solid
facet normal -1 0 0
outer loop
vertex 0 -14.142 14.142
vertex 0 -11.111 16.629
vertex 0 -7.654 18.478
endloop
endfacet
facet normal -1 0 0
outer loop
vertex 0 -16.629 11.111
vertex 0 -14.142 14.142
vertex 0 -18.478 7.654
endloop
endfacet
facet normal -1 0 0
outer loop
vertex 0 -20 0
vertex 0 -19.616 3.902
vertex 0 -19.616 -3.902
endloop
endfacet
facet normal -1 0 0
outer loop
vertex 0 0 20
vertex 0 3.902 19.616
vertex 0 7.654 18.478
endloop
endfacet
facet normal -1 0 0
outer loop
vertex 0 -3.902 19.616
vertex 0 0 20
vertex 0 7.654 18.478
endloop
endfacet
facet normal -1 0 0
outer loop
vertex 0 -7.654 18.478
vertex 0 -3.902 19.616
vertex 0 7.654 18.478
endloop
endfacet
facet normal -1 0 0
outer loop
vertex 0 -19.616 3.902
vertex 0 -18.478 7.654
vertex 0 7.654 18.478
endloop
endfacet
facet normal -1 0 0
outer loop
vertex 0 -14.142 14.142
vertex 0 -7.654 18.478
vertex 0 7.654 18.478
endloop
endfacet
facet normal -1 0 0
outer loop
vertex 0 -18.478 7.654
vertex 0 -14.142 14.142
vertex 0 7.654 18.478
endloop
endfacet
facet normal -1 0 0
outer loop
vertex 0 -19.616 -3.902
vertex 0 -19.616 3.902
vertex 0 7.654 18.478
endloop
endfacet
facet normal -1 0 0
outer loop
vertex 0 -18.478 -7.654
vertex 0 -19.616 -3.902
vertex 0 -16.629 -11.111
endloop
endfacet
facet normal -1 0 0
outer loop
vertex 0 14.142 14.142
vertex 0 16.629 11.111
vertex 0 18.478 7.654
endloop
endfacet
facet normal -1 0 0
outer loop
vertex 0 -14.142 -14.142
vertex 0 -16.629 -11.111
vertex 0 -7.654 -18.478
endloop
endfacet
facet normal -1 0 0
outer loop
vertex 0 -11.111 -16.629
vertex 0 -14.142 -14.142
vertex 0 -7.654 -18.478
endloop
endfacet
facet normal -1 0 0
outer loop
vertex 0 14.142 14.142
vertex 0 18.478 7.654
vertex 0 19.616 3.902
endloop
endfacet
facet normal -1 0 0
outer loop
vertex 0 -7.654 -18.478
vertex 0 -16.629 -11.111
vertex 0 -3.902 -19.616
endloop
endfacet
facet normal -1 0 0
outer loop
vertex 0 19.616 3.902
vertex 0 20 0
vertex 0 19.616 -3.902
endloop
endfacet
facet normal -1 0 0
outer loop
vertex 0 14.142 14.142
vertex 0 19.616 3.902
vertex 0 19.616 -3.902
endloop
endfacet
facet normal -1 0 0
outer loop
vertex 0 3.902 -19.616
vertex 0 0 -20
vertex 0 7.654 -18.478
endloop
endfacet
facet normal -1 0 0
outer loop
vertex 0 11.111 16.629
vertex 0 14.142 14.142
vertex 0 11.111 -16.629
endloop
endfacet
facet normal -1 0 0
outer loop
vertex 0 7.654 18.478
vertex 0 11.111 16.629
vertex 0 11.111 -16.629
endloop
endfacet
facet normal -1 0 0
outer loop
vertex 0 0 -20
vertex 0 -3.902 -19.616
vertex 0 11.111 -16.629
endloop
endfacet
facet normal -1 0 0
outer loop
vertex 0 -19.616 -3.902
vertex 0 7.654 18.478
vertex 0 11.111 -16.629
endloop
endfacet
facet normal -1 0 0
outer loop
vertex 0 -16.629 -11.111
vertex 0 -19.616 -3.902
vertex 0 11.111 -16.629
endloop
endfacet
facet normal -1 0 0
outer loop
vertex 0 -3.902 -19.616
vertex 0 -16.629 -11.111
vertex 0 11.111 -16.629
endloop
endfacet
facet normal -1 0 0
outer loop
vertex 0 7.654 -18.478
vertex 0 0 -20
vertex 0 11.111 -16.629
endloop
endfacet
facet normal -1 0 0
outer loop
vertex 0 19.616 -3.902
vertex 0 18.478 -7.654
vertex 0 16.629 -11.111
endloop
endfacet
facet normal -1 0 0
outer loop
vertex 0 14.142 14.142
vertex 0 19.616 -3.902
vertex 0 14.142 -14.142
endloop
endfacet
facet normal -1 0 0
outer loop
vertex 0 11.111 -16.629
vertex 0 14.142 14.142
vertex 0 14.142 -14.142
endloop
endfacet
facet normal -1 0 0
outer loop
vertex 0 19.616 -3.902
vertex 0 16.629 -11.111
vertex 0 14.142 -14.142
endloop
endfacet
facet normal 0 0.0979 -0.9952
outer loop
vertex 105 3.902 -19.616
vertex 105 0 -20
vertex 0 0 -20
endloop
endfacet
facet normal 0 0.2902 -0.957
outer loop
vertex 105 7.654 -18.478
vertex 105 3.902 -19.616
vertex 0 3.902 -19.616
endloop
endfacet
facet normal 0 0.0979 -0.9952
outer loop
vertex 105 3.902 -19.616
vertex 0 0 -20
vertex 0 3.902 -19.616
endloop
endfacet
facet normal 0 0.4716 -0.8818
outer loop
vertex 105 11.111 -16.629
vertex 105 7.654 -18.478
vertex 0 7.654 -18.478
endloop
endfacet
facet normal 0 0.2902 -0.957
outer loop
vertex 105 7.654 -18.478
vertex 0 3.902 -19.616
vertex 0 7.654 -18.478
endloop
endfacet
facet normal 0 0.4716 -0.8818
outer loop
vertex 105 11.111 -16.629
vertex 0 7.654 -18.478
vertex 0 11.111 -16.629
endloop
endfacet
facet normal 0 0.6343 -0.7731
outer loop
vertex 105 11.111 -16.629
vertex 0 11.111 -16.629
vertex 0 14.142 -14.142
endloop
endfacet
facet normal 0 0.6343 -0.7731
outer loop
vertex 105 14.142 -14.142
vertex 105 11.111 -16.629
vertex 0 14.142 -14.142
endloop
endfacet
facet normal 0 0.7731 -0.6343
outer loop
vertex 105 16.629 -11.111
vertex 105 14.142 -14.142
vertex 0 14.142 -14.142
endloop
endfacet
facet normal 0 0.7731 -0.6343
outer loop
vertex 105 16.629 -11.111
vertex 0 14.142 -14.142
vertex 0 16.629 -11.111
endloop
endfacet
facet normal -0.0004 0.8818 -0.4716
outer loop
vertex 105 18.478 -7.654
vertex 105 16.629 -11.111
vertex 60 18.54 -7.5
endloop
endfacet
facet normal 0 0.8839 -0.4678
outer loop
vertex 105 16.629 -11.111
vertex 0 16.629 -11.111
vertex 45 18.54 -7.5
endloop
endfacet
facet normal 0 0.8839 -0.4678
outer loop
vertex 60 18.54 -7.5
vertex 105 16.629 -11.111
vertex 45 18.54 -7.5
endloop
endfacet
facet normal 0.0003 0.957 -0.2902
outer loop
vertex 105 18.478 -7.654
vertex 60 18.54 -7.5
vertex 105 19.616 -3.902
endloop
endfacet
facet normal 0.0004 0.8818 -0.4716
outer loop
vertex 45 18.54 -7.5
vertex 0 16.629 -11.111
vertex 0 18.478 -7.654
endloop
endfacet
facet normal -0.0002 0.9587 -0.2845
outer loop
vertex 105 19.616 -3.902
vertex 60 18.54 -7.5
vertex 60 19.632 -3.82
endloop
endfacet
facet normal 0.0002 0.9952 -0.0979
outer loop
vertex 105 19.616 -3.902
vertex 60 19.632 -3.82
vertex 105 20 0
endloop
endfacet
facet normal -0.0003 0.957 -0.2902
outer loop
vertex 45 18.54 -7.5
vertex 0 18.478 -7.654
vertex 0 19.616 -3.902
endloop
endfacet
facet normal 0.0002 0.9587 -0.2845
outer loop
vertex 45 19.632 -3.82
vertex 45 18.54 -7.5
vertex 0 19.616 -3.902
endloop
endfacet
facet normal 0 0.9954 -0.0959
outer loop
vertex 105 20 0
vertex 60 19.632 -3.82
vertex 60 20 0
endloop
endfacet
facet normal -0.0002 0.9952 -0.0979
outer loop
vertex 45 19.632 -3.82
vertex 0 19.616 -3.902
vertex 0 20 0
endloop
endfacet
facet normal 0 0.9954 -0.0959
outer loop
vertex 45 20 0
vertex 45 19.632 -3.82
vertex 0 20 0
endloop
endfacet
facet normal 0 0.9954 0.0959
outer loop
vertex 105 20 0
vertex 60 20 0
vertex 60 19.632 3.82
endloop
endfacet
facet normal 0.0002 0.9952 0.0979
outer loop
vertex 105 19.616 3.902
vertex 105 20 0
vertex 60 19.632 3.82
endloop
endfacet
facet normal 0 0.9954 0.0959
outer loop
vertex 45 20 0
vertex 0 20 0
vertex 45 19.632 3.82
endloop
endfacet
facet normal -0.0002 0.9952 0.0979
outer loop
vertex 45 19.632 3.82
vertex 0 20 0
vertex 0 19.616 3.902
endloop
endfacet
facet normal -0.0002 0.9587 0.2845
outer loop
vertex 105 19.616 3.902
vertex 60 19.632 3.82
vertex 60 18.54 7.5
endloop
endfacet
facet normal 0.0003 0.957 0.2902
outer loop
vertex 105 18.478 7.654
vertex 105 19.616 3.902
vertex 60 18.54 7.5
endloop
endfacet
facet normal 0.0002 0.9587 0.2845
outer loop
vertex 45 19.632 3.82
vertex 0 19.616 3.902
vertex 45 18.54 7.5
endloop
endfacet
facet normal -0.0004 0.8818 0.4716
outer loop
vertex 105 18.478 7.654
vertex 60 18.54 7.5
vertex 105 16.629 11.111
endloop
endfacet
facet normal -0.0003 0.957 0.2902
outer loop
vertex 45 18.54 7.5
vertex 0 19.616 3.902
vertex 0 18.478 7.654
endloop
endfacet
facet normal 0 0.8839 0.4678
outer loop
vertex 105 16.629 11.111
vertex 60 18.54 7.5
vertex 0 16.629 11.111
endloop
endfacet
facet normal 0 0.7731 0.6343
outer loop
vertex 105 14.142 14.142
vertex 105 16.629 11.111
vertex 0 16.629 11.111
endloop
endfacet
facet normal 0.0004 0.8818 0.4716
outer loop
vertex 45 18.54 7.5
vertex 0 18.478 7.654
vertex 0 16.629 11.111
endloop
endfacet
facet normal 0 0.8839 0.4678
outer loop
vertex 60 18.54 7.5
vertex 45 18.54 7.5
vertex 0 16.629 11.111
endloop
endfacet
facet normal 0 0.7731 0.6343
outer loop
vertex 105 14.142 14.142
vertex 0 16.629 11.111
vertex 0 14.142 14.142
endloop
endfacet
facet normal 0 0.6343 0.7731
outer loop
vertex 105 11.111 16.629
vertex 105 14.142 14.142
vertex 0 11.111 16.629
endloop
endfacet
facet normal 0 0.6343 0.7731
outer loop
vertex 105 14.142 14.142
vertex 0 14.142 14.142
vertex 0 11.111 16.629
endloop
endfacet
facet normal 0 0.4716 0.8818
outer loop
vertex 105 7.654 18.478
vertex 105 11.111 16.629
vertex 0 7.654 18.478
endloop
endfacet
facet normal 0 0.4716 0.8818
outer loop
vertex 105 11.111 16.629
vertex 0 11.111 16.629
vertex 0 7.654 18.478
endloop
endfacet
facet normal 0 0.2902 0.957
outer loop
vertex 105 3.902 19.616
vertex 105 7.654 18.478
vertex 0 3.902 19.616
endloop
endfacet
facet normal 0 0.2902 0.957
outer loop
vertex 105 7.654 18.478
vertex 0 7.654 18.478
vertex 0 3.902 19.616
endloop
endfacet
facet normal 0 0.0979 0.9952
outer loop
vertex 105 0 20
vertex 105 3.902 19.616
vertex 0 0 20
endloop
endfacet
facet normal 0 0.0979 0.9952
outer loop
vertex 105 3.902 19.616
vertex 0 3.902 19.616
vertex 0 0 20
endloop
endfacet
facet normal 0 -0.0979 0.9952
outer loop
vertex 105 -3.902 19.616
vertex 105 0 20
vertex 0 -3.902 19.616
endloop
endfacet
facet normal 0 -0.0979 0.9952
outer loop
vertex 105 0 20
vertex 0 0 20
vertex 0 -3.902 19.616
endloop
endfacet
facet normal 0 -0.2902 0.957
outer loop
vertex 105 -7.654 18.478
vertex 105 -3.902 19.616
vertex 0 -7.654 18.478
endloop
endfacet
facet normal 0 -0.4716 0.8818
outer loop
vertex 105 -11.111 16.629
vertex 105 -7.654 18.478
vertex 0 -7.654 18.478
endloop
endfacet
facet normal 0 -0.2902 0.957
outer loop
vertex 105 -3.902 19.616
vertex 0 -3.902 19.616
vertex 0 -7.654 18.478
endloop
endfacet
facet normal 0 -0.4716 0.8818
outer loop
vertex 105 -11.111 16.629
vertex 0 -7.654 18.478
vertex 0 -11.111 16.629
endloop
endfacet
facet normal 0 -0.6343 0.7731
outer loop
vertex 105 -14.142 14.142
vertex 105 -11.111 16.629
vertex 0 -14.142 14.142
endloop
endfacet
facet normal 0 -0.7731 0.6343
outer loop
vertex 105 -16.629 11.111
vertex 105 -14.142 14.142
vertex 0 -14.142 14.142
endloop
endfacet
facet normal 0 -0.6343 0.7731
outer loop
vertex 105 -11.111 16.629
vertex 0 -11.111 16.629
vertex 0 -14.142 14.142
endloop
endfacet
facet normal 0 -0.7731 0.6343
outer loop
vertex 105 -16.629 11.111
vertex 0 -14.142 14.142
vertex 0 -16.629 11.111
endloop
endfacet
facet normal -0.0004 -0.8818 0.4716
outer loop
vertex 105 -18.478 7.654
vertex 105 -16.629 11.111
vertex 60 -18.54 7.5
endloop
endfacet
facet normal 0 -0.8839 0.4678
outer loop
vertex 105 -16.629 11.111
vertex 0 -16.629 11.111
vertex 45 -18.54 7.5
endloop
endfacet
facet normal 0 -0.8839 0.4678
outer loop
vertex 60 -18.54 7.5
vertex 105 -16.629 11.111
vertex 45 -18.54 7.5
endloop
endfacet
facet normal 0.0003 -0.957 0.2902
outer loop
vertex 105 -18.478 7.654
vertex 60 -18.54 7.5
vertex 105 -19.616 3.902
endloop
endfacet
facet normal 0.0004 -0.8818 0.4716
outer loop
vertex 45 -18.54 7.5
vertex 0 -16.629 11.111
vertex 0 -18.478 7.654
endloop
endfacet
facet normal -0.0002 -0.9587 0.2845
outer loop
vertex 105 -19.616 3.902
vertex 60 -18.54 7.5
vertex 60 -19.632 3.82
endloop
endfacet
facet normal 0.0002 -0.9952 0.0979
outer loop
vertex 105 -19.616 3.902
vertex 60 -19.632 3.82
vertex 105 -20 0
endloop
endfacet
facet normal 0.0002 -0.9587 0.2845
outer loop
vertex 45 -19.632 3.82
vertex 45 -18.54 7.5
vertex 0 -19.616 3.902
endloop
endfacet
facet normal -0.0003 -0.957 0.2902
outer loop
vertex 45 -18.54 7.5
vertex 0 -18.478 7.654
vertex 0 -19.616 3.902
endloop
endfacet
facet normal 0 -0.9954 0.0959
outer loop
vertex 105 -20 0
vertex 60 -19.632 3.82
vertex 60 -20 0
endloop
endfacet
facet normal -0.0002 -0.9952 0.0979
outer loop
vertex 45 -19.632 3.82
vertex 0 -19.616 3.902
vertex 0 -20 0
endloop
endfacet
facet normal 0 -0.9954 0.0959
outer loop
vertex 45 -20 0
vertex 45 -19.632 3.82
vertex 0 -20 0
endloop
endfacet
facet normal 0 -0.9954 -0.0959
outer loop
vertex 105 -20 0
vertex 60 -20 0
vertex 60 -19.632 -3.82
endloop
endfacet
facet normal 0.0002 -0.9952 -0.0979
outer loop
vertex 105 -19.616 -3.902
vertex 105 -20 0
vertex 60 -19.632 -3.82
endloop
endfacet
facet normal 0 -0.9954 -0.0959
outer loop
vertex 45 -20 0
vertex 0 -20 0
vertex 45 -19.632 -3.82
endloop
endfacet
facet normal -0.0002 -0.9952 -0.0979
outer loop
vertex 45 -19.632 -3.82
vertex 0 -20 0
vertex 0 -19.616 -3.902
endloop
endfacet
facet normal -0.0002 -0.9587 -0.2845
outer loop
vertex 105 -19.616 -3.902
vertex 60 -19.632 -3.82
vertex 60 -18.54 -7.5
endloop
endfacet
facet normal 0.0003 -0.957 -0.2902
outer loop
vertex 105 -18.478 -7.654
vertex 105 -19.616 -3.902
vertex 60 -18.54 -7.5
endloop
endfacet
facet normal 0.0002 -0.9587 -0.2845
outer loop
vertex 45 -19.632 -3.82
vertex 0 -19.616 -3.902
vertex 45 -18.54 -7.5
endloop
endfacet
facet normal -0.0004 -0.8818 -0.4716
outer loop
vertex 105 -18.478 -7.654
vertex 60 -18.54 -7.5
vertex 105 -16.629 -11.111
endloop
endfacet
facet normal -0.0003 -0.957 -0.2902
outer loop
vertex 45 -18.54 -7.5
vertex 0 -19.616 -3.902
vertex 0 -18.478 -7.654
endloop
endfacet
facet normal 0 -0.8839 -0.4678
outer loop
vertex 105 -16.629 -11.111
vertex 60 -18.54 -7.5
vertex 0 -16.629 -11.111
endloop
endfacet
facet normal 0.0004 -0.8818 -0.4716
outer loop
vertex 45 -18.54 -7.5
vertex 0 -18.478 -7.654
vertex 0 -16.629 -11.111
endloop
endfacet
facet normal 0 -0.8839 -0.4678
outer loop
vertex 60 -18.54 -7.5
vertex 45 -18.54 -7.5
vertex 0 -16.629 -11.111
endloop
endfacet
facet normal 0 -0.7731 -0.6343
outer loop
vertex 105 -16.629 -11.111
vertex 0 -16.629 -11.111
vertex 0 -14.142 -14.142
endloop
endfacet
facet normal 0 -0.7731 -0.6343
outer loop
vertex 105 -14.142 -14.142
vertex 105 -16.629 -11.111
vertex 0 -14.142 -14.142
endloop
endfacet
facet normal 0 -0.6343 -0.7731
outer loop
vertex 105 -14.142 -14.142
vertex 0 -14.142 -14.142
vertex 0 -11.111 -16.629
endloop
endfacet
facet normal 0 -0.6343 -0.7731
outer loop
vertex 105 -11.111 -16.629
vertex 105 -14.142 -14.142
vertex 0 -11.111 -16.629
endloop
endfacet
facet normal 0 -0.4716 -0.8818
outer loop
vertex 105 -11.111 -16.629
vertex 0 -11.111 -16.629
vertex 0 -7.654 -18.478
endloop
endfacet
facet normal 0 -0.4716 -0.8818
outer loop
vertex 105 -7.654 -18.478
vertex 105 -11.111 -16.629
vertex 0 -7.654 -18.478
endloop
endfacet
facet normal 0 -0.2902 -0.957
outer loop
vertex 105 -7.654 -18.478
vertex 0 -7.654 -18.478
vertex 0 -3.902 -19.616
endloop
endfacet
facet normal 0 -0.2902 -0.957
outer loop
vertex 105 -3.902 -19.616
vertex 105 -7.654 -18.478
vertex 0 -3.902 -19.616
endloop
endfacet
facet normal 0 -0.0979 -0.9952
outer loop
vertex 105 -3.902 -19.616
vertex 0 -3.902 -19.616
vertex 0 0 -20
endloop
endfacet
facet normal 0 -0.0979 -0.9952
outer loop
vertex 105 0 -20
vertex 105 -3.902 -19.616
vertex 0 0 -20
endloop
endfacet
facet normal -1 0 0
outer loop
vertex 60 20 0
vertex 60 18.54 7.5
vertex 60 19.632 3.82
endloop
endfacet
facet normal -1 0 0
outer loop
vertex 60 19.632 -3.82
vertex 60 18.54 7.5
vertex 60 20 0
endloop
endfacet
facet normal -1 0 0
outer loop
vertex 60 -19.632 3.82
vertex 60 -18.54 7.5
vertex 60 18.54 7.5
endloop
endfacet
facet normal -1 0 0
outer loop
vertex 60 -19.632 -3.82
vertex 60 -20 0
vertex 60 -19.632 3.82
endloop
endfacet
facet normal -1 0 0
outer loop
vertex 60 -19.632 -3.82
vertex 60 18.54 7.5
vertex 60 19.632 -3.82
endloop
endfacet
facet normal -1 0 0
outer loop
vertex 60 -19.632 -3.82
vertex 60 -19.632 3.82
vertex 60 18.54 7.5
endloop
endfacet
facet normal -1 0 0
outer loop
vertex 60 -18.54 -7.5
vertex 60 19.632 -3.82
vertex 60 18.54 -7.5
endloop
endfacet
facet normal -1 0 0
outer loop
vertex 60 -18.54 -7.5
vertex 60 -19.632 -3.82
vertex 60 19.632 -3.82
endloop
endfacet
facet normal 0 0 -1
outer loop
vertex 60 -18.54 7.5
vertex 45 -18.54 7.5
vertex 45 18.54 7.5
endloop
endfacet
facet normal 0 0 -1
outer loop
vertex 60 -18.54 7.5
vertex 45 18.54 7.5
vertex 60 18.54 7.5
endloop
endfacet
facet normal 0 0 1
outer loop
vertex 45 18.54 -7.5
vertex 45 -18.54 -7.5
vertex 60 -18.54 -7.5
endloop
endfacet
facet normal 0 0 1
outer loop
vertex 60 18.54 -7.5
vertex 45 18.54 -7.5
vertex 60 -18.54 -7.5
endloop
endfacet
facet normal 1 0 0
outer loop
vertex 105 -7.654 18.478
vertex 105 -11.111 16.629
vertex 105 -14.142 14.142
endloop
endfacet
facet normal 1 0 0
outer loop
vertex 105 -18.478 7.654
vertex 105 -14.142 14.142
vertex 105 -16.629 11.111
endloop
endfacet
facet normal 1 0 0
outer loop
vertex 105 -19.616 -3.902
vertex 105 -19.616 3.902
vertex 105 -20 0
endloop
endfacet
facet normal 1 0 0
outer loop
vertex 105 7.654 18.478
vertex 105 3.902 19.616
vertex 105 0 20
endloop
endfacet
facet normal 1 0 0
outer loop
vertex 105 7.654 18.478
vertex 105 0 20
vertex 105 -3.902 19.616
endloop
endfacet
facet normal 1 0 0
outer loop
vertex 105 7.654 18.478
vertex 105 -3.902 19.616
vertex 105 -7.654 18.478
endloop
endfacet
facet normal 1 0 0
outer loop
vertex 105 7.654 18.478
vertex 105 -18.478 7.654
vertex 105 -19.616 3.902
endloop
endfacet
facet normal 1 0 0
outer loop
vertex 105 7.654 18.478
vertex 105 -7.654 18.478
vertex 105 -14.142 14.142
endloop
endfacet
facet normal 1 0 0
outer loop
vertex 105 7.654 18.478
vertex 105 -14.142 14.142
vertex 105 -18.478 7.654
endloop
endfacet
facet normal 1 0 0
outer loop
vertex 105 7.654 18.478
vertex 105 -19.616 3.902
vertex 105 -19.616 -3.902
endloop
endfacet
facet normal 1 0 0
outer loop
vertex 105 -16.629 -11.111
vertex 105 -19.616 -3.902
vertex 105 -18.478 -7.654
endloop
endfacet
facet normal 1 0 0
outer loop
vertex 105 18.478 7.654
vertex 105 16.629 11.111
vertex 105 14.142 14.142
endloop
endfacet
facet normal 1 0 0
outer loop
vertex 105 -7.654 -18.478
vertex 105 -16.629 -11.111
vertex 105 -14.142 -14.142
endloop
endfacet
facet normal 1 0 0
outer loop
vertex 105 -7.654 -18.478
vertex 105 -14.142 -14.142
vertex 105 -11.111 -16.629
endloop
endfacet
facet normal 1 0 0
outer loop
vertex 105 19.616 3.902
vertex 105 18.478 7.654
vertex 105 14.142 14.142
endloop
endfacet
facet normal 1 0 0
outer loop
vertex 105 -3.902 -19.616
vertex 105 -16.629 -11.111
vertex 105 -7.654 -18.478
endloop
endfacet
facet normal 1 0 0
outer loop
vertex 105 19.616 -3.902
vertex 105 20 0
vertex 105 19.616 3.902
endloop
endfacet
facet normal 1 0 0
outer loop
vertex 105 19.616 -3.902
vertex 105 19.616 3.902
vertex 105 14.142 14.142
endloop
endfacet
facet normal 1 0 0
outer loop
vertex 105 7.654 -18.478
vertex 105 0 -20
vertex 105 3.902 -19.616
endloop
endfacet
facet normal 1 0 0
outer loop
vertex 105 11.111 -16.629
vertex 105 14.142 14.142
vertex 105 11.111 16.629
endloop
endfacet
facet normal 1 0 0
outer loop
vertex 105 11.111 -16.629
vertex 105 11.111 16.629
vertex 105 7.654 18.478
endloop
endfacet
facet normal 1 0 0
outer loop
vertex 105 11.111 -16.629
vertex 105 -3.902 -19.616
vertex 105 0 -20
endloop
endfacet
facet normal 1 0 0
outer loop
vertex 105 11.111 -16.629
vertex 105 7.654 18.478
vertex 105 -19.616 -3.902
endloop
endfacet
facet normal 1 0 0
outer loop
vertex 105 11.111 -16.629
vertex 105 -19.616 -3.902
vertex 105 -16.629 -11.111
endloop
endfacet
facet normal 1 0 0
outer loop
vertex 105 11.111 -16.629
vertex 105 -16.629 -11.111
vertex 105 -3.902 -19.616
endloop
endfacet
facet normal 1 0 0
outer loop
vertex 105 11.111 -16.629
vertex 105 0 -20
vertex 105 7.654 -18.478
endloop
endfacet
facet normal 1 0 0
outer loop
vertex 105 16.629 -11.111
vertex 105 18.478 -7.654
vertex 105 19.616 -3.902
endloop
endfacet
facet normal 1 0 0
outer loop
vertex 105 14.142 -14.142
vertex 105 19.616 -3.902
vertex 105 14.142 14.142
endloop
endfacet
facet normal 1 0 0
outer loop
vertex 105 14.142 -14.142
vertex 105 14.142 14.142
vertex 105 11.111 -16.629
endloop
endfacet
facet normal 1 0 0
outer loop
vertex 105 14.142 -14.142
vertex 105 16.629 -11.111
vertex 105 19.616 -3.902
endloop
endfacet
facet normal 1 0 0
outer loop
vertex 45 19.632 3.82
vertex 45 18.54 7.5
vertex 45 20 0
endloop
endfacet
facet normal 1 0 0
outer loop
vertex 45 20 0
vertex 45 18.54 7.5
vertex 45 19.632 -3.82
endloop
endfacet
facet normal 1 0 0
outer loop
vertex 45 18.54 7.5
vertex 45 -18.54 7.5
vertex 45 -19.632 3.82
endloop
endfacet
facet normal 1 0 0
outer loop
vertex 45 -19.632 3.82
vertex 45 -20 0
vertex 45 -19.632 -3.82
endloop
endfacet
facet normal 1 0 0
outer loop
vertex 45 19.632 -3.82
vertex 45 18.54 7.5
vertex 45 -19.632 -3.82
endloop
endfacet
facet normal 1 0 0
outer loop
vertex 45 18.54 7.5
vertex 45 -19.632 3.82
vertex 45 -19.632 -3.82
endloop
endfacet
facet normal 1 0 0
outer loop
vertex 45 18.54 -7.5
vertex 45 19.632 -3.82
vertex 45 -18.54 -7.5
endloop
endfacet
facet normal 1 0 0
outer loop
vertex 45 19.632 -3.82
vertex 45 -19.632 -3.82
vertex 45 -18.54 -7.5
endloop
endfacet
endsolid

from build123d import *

# Parameters (mm, degrees)
SKETCH1_R                           = 20
BOSS_EXTRUDE1_DEPTH                 = 105
CUT_EXTRUDE1_REACH                  = 110.743
CUT_EXTRUDE1_END_RADIUS             = 20
SKETCH2_W                           = 15
SKETCH2_H                           = 15
CUT_EXTRUDE1_DIRECTION_2_REACH      = 110.743
CUT_EXTRUDE1_DIRECTION_2_END_RADIUS = 20


with BuildPart() as part:
    # Sketch1 → Boss-Extrude1 (new body)
    with BuildSketch(Plane(origin=(0, 0, 0), x_dir=(0, 0, -1), z_dir=(1, 0, 0))):
        Circle(SKETCH1_R)
    extrude(amount=BOSS_EXTRUDE1_DEPTH)

    # Cut-Extrude1: up to this cylinder (the profile starts inside it)
    cut_extrude1_end = Plane(origin=(52.5, 0, 0), z_dir=(-1, 0, 0)) * Cylinder(CUT_EXTRUDE1_END_RADIUS, 262.486, mode=Mode.PRIVATE)
    # Sketch2 → Cut-Extrude1 (cut, up to the surface)
    with BuildSketch(Plane(origin=(0, 0, 0), x_dir=(1, 0, 0), z_dir=(0, 1, 0)), mode=Mode.PRIVATE) as cut_extrude1_sk1:
        with Locations((52.5, 0)):
            Rectangle(SKETCH2_W, SKETCH2_H)
    cut_extrude1_tool1 = extrude(cut_extrude1_sk1.sketch, amount=-CUT_EXTRUDE1_REACH, mode=Mode.PRIVATE) & cut_extrude1_end
    add(cut_extrude1_tool1.solids().sort_by_distance((52.5, 0, 0))[0], mode=Mode.SUBTRACT)

    # Cut-Extrude1 direction 2: up to this cylinder (the profile starts inside it)
    cut_extrude1_direction_2_end = Plane(origin=(52.5, 0, 0), z_dir=(-1, 0, 0)) * Cylinder(CUT_EXTRUDE1_DIRECTION_2_END_RADIUS, 262.486, mode=Mode.PRIVATE)
    # Sketch2 → Cut-Extrude1 direction 2 (cut, up to the surface)
    with BuildSketch(Plane(origin=(0, 0, 0), x_dir=(1, 0, 0), z_dir=(0, 1, 0)), mode=Mode.PRIVATE) as cut_extrude1_direction_2_sk1:
        with Locations((52.5, 0)):
            Rectangle(SKETCH2_W, SKETCH2_H)
    cut_extrude1_direction_2_tool1 = extrude(cut_extrude1_direction_2_sk1.sketch, amount=CUT_EXTRUDE1_DIRECTION_2_REACH, mode=Mode.PRIVATE) & cut_extrude1_direction_2_end
    add(cut_extrude1_direction_2_tool1.solids().sort_by_distance((52.5, 0, 0))[0], mode=Mode.SUBTRACT)


solid = part.part
